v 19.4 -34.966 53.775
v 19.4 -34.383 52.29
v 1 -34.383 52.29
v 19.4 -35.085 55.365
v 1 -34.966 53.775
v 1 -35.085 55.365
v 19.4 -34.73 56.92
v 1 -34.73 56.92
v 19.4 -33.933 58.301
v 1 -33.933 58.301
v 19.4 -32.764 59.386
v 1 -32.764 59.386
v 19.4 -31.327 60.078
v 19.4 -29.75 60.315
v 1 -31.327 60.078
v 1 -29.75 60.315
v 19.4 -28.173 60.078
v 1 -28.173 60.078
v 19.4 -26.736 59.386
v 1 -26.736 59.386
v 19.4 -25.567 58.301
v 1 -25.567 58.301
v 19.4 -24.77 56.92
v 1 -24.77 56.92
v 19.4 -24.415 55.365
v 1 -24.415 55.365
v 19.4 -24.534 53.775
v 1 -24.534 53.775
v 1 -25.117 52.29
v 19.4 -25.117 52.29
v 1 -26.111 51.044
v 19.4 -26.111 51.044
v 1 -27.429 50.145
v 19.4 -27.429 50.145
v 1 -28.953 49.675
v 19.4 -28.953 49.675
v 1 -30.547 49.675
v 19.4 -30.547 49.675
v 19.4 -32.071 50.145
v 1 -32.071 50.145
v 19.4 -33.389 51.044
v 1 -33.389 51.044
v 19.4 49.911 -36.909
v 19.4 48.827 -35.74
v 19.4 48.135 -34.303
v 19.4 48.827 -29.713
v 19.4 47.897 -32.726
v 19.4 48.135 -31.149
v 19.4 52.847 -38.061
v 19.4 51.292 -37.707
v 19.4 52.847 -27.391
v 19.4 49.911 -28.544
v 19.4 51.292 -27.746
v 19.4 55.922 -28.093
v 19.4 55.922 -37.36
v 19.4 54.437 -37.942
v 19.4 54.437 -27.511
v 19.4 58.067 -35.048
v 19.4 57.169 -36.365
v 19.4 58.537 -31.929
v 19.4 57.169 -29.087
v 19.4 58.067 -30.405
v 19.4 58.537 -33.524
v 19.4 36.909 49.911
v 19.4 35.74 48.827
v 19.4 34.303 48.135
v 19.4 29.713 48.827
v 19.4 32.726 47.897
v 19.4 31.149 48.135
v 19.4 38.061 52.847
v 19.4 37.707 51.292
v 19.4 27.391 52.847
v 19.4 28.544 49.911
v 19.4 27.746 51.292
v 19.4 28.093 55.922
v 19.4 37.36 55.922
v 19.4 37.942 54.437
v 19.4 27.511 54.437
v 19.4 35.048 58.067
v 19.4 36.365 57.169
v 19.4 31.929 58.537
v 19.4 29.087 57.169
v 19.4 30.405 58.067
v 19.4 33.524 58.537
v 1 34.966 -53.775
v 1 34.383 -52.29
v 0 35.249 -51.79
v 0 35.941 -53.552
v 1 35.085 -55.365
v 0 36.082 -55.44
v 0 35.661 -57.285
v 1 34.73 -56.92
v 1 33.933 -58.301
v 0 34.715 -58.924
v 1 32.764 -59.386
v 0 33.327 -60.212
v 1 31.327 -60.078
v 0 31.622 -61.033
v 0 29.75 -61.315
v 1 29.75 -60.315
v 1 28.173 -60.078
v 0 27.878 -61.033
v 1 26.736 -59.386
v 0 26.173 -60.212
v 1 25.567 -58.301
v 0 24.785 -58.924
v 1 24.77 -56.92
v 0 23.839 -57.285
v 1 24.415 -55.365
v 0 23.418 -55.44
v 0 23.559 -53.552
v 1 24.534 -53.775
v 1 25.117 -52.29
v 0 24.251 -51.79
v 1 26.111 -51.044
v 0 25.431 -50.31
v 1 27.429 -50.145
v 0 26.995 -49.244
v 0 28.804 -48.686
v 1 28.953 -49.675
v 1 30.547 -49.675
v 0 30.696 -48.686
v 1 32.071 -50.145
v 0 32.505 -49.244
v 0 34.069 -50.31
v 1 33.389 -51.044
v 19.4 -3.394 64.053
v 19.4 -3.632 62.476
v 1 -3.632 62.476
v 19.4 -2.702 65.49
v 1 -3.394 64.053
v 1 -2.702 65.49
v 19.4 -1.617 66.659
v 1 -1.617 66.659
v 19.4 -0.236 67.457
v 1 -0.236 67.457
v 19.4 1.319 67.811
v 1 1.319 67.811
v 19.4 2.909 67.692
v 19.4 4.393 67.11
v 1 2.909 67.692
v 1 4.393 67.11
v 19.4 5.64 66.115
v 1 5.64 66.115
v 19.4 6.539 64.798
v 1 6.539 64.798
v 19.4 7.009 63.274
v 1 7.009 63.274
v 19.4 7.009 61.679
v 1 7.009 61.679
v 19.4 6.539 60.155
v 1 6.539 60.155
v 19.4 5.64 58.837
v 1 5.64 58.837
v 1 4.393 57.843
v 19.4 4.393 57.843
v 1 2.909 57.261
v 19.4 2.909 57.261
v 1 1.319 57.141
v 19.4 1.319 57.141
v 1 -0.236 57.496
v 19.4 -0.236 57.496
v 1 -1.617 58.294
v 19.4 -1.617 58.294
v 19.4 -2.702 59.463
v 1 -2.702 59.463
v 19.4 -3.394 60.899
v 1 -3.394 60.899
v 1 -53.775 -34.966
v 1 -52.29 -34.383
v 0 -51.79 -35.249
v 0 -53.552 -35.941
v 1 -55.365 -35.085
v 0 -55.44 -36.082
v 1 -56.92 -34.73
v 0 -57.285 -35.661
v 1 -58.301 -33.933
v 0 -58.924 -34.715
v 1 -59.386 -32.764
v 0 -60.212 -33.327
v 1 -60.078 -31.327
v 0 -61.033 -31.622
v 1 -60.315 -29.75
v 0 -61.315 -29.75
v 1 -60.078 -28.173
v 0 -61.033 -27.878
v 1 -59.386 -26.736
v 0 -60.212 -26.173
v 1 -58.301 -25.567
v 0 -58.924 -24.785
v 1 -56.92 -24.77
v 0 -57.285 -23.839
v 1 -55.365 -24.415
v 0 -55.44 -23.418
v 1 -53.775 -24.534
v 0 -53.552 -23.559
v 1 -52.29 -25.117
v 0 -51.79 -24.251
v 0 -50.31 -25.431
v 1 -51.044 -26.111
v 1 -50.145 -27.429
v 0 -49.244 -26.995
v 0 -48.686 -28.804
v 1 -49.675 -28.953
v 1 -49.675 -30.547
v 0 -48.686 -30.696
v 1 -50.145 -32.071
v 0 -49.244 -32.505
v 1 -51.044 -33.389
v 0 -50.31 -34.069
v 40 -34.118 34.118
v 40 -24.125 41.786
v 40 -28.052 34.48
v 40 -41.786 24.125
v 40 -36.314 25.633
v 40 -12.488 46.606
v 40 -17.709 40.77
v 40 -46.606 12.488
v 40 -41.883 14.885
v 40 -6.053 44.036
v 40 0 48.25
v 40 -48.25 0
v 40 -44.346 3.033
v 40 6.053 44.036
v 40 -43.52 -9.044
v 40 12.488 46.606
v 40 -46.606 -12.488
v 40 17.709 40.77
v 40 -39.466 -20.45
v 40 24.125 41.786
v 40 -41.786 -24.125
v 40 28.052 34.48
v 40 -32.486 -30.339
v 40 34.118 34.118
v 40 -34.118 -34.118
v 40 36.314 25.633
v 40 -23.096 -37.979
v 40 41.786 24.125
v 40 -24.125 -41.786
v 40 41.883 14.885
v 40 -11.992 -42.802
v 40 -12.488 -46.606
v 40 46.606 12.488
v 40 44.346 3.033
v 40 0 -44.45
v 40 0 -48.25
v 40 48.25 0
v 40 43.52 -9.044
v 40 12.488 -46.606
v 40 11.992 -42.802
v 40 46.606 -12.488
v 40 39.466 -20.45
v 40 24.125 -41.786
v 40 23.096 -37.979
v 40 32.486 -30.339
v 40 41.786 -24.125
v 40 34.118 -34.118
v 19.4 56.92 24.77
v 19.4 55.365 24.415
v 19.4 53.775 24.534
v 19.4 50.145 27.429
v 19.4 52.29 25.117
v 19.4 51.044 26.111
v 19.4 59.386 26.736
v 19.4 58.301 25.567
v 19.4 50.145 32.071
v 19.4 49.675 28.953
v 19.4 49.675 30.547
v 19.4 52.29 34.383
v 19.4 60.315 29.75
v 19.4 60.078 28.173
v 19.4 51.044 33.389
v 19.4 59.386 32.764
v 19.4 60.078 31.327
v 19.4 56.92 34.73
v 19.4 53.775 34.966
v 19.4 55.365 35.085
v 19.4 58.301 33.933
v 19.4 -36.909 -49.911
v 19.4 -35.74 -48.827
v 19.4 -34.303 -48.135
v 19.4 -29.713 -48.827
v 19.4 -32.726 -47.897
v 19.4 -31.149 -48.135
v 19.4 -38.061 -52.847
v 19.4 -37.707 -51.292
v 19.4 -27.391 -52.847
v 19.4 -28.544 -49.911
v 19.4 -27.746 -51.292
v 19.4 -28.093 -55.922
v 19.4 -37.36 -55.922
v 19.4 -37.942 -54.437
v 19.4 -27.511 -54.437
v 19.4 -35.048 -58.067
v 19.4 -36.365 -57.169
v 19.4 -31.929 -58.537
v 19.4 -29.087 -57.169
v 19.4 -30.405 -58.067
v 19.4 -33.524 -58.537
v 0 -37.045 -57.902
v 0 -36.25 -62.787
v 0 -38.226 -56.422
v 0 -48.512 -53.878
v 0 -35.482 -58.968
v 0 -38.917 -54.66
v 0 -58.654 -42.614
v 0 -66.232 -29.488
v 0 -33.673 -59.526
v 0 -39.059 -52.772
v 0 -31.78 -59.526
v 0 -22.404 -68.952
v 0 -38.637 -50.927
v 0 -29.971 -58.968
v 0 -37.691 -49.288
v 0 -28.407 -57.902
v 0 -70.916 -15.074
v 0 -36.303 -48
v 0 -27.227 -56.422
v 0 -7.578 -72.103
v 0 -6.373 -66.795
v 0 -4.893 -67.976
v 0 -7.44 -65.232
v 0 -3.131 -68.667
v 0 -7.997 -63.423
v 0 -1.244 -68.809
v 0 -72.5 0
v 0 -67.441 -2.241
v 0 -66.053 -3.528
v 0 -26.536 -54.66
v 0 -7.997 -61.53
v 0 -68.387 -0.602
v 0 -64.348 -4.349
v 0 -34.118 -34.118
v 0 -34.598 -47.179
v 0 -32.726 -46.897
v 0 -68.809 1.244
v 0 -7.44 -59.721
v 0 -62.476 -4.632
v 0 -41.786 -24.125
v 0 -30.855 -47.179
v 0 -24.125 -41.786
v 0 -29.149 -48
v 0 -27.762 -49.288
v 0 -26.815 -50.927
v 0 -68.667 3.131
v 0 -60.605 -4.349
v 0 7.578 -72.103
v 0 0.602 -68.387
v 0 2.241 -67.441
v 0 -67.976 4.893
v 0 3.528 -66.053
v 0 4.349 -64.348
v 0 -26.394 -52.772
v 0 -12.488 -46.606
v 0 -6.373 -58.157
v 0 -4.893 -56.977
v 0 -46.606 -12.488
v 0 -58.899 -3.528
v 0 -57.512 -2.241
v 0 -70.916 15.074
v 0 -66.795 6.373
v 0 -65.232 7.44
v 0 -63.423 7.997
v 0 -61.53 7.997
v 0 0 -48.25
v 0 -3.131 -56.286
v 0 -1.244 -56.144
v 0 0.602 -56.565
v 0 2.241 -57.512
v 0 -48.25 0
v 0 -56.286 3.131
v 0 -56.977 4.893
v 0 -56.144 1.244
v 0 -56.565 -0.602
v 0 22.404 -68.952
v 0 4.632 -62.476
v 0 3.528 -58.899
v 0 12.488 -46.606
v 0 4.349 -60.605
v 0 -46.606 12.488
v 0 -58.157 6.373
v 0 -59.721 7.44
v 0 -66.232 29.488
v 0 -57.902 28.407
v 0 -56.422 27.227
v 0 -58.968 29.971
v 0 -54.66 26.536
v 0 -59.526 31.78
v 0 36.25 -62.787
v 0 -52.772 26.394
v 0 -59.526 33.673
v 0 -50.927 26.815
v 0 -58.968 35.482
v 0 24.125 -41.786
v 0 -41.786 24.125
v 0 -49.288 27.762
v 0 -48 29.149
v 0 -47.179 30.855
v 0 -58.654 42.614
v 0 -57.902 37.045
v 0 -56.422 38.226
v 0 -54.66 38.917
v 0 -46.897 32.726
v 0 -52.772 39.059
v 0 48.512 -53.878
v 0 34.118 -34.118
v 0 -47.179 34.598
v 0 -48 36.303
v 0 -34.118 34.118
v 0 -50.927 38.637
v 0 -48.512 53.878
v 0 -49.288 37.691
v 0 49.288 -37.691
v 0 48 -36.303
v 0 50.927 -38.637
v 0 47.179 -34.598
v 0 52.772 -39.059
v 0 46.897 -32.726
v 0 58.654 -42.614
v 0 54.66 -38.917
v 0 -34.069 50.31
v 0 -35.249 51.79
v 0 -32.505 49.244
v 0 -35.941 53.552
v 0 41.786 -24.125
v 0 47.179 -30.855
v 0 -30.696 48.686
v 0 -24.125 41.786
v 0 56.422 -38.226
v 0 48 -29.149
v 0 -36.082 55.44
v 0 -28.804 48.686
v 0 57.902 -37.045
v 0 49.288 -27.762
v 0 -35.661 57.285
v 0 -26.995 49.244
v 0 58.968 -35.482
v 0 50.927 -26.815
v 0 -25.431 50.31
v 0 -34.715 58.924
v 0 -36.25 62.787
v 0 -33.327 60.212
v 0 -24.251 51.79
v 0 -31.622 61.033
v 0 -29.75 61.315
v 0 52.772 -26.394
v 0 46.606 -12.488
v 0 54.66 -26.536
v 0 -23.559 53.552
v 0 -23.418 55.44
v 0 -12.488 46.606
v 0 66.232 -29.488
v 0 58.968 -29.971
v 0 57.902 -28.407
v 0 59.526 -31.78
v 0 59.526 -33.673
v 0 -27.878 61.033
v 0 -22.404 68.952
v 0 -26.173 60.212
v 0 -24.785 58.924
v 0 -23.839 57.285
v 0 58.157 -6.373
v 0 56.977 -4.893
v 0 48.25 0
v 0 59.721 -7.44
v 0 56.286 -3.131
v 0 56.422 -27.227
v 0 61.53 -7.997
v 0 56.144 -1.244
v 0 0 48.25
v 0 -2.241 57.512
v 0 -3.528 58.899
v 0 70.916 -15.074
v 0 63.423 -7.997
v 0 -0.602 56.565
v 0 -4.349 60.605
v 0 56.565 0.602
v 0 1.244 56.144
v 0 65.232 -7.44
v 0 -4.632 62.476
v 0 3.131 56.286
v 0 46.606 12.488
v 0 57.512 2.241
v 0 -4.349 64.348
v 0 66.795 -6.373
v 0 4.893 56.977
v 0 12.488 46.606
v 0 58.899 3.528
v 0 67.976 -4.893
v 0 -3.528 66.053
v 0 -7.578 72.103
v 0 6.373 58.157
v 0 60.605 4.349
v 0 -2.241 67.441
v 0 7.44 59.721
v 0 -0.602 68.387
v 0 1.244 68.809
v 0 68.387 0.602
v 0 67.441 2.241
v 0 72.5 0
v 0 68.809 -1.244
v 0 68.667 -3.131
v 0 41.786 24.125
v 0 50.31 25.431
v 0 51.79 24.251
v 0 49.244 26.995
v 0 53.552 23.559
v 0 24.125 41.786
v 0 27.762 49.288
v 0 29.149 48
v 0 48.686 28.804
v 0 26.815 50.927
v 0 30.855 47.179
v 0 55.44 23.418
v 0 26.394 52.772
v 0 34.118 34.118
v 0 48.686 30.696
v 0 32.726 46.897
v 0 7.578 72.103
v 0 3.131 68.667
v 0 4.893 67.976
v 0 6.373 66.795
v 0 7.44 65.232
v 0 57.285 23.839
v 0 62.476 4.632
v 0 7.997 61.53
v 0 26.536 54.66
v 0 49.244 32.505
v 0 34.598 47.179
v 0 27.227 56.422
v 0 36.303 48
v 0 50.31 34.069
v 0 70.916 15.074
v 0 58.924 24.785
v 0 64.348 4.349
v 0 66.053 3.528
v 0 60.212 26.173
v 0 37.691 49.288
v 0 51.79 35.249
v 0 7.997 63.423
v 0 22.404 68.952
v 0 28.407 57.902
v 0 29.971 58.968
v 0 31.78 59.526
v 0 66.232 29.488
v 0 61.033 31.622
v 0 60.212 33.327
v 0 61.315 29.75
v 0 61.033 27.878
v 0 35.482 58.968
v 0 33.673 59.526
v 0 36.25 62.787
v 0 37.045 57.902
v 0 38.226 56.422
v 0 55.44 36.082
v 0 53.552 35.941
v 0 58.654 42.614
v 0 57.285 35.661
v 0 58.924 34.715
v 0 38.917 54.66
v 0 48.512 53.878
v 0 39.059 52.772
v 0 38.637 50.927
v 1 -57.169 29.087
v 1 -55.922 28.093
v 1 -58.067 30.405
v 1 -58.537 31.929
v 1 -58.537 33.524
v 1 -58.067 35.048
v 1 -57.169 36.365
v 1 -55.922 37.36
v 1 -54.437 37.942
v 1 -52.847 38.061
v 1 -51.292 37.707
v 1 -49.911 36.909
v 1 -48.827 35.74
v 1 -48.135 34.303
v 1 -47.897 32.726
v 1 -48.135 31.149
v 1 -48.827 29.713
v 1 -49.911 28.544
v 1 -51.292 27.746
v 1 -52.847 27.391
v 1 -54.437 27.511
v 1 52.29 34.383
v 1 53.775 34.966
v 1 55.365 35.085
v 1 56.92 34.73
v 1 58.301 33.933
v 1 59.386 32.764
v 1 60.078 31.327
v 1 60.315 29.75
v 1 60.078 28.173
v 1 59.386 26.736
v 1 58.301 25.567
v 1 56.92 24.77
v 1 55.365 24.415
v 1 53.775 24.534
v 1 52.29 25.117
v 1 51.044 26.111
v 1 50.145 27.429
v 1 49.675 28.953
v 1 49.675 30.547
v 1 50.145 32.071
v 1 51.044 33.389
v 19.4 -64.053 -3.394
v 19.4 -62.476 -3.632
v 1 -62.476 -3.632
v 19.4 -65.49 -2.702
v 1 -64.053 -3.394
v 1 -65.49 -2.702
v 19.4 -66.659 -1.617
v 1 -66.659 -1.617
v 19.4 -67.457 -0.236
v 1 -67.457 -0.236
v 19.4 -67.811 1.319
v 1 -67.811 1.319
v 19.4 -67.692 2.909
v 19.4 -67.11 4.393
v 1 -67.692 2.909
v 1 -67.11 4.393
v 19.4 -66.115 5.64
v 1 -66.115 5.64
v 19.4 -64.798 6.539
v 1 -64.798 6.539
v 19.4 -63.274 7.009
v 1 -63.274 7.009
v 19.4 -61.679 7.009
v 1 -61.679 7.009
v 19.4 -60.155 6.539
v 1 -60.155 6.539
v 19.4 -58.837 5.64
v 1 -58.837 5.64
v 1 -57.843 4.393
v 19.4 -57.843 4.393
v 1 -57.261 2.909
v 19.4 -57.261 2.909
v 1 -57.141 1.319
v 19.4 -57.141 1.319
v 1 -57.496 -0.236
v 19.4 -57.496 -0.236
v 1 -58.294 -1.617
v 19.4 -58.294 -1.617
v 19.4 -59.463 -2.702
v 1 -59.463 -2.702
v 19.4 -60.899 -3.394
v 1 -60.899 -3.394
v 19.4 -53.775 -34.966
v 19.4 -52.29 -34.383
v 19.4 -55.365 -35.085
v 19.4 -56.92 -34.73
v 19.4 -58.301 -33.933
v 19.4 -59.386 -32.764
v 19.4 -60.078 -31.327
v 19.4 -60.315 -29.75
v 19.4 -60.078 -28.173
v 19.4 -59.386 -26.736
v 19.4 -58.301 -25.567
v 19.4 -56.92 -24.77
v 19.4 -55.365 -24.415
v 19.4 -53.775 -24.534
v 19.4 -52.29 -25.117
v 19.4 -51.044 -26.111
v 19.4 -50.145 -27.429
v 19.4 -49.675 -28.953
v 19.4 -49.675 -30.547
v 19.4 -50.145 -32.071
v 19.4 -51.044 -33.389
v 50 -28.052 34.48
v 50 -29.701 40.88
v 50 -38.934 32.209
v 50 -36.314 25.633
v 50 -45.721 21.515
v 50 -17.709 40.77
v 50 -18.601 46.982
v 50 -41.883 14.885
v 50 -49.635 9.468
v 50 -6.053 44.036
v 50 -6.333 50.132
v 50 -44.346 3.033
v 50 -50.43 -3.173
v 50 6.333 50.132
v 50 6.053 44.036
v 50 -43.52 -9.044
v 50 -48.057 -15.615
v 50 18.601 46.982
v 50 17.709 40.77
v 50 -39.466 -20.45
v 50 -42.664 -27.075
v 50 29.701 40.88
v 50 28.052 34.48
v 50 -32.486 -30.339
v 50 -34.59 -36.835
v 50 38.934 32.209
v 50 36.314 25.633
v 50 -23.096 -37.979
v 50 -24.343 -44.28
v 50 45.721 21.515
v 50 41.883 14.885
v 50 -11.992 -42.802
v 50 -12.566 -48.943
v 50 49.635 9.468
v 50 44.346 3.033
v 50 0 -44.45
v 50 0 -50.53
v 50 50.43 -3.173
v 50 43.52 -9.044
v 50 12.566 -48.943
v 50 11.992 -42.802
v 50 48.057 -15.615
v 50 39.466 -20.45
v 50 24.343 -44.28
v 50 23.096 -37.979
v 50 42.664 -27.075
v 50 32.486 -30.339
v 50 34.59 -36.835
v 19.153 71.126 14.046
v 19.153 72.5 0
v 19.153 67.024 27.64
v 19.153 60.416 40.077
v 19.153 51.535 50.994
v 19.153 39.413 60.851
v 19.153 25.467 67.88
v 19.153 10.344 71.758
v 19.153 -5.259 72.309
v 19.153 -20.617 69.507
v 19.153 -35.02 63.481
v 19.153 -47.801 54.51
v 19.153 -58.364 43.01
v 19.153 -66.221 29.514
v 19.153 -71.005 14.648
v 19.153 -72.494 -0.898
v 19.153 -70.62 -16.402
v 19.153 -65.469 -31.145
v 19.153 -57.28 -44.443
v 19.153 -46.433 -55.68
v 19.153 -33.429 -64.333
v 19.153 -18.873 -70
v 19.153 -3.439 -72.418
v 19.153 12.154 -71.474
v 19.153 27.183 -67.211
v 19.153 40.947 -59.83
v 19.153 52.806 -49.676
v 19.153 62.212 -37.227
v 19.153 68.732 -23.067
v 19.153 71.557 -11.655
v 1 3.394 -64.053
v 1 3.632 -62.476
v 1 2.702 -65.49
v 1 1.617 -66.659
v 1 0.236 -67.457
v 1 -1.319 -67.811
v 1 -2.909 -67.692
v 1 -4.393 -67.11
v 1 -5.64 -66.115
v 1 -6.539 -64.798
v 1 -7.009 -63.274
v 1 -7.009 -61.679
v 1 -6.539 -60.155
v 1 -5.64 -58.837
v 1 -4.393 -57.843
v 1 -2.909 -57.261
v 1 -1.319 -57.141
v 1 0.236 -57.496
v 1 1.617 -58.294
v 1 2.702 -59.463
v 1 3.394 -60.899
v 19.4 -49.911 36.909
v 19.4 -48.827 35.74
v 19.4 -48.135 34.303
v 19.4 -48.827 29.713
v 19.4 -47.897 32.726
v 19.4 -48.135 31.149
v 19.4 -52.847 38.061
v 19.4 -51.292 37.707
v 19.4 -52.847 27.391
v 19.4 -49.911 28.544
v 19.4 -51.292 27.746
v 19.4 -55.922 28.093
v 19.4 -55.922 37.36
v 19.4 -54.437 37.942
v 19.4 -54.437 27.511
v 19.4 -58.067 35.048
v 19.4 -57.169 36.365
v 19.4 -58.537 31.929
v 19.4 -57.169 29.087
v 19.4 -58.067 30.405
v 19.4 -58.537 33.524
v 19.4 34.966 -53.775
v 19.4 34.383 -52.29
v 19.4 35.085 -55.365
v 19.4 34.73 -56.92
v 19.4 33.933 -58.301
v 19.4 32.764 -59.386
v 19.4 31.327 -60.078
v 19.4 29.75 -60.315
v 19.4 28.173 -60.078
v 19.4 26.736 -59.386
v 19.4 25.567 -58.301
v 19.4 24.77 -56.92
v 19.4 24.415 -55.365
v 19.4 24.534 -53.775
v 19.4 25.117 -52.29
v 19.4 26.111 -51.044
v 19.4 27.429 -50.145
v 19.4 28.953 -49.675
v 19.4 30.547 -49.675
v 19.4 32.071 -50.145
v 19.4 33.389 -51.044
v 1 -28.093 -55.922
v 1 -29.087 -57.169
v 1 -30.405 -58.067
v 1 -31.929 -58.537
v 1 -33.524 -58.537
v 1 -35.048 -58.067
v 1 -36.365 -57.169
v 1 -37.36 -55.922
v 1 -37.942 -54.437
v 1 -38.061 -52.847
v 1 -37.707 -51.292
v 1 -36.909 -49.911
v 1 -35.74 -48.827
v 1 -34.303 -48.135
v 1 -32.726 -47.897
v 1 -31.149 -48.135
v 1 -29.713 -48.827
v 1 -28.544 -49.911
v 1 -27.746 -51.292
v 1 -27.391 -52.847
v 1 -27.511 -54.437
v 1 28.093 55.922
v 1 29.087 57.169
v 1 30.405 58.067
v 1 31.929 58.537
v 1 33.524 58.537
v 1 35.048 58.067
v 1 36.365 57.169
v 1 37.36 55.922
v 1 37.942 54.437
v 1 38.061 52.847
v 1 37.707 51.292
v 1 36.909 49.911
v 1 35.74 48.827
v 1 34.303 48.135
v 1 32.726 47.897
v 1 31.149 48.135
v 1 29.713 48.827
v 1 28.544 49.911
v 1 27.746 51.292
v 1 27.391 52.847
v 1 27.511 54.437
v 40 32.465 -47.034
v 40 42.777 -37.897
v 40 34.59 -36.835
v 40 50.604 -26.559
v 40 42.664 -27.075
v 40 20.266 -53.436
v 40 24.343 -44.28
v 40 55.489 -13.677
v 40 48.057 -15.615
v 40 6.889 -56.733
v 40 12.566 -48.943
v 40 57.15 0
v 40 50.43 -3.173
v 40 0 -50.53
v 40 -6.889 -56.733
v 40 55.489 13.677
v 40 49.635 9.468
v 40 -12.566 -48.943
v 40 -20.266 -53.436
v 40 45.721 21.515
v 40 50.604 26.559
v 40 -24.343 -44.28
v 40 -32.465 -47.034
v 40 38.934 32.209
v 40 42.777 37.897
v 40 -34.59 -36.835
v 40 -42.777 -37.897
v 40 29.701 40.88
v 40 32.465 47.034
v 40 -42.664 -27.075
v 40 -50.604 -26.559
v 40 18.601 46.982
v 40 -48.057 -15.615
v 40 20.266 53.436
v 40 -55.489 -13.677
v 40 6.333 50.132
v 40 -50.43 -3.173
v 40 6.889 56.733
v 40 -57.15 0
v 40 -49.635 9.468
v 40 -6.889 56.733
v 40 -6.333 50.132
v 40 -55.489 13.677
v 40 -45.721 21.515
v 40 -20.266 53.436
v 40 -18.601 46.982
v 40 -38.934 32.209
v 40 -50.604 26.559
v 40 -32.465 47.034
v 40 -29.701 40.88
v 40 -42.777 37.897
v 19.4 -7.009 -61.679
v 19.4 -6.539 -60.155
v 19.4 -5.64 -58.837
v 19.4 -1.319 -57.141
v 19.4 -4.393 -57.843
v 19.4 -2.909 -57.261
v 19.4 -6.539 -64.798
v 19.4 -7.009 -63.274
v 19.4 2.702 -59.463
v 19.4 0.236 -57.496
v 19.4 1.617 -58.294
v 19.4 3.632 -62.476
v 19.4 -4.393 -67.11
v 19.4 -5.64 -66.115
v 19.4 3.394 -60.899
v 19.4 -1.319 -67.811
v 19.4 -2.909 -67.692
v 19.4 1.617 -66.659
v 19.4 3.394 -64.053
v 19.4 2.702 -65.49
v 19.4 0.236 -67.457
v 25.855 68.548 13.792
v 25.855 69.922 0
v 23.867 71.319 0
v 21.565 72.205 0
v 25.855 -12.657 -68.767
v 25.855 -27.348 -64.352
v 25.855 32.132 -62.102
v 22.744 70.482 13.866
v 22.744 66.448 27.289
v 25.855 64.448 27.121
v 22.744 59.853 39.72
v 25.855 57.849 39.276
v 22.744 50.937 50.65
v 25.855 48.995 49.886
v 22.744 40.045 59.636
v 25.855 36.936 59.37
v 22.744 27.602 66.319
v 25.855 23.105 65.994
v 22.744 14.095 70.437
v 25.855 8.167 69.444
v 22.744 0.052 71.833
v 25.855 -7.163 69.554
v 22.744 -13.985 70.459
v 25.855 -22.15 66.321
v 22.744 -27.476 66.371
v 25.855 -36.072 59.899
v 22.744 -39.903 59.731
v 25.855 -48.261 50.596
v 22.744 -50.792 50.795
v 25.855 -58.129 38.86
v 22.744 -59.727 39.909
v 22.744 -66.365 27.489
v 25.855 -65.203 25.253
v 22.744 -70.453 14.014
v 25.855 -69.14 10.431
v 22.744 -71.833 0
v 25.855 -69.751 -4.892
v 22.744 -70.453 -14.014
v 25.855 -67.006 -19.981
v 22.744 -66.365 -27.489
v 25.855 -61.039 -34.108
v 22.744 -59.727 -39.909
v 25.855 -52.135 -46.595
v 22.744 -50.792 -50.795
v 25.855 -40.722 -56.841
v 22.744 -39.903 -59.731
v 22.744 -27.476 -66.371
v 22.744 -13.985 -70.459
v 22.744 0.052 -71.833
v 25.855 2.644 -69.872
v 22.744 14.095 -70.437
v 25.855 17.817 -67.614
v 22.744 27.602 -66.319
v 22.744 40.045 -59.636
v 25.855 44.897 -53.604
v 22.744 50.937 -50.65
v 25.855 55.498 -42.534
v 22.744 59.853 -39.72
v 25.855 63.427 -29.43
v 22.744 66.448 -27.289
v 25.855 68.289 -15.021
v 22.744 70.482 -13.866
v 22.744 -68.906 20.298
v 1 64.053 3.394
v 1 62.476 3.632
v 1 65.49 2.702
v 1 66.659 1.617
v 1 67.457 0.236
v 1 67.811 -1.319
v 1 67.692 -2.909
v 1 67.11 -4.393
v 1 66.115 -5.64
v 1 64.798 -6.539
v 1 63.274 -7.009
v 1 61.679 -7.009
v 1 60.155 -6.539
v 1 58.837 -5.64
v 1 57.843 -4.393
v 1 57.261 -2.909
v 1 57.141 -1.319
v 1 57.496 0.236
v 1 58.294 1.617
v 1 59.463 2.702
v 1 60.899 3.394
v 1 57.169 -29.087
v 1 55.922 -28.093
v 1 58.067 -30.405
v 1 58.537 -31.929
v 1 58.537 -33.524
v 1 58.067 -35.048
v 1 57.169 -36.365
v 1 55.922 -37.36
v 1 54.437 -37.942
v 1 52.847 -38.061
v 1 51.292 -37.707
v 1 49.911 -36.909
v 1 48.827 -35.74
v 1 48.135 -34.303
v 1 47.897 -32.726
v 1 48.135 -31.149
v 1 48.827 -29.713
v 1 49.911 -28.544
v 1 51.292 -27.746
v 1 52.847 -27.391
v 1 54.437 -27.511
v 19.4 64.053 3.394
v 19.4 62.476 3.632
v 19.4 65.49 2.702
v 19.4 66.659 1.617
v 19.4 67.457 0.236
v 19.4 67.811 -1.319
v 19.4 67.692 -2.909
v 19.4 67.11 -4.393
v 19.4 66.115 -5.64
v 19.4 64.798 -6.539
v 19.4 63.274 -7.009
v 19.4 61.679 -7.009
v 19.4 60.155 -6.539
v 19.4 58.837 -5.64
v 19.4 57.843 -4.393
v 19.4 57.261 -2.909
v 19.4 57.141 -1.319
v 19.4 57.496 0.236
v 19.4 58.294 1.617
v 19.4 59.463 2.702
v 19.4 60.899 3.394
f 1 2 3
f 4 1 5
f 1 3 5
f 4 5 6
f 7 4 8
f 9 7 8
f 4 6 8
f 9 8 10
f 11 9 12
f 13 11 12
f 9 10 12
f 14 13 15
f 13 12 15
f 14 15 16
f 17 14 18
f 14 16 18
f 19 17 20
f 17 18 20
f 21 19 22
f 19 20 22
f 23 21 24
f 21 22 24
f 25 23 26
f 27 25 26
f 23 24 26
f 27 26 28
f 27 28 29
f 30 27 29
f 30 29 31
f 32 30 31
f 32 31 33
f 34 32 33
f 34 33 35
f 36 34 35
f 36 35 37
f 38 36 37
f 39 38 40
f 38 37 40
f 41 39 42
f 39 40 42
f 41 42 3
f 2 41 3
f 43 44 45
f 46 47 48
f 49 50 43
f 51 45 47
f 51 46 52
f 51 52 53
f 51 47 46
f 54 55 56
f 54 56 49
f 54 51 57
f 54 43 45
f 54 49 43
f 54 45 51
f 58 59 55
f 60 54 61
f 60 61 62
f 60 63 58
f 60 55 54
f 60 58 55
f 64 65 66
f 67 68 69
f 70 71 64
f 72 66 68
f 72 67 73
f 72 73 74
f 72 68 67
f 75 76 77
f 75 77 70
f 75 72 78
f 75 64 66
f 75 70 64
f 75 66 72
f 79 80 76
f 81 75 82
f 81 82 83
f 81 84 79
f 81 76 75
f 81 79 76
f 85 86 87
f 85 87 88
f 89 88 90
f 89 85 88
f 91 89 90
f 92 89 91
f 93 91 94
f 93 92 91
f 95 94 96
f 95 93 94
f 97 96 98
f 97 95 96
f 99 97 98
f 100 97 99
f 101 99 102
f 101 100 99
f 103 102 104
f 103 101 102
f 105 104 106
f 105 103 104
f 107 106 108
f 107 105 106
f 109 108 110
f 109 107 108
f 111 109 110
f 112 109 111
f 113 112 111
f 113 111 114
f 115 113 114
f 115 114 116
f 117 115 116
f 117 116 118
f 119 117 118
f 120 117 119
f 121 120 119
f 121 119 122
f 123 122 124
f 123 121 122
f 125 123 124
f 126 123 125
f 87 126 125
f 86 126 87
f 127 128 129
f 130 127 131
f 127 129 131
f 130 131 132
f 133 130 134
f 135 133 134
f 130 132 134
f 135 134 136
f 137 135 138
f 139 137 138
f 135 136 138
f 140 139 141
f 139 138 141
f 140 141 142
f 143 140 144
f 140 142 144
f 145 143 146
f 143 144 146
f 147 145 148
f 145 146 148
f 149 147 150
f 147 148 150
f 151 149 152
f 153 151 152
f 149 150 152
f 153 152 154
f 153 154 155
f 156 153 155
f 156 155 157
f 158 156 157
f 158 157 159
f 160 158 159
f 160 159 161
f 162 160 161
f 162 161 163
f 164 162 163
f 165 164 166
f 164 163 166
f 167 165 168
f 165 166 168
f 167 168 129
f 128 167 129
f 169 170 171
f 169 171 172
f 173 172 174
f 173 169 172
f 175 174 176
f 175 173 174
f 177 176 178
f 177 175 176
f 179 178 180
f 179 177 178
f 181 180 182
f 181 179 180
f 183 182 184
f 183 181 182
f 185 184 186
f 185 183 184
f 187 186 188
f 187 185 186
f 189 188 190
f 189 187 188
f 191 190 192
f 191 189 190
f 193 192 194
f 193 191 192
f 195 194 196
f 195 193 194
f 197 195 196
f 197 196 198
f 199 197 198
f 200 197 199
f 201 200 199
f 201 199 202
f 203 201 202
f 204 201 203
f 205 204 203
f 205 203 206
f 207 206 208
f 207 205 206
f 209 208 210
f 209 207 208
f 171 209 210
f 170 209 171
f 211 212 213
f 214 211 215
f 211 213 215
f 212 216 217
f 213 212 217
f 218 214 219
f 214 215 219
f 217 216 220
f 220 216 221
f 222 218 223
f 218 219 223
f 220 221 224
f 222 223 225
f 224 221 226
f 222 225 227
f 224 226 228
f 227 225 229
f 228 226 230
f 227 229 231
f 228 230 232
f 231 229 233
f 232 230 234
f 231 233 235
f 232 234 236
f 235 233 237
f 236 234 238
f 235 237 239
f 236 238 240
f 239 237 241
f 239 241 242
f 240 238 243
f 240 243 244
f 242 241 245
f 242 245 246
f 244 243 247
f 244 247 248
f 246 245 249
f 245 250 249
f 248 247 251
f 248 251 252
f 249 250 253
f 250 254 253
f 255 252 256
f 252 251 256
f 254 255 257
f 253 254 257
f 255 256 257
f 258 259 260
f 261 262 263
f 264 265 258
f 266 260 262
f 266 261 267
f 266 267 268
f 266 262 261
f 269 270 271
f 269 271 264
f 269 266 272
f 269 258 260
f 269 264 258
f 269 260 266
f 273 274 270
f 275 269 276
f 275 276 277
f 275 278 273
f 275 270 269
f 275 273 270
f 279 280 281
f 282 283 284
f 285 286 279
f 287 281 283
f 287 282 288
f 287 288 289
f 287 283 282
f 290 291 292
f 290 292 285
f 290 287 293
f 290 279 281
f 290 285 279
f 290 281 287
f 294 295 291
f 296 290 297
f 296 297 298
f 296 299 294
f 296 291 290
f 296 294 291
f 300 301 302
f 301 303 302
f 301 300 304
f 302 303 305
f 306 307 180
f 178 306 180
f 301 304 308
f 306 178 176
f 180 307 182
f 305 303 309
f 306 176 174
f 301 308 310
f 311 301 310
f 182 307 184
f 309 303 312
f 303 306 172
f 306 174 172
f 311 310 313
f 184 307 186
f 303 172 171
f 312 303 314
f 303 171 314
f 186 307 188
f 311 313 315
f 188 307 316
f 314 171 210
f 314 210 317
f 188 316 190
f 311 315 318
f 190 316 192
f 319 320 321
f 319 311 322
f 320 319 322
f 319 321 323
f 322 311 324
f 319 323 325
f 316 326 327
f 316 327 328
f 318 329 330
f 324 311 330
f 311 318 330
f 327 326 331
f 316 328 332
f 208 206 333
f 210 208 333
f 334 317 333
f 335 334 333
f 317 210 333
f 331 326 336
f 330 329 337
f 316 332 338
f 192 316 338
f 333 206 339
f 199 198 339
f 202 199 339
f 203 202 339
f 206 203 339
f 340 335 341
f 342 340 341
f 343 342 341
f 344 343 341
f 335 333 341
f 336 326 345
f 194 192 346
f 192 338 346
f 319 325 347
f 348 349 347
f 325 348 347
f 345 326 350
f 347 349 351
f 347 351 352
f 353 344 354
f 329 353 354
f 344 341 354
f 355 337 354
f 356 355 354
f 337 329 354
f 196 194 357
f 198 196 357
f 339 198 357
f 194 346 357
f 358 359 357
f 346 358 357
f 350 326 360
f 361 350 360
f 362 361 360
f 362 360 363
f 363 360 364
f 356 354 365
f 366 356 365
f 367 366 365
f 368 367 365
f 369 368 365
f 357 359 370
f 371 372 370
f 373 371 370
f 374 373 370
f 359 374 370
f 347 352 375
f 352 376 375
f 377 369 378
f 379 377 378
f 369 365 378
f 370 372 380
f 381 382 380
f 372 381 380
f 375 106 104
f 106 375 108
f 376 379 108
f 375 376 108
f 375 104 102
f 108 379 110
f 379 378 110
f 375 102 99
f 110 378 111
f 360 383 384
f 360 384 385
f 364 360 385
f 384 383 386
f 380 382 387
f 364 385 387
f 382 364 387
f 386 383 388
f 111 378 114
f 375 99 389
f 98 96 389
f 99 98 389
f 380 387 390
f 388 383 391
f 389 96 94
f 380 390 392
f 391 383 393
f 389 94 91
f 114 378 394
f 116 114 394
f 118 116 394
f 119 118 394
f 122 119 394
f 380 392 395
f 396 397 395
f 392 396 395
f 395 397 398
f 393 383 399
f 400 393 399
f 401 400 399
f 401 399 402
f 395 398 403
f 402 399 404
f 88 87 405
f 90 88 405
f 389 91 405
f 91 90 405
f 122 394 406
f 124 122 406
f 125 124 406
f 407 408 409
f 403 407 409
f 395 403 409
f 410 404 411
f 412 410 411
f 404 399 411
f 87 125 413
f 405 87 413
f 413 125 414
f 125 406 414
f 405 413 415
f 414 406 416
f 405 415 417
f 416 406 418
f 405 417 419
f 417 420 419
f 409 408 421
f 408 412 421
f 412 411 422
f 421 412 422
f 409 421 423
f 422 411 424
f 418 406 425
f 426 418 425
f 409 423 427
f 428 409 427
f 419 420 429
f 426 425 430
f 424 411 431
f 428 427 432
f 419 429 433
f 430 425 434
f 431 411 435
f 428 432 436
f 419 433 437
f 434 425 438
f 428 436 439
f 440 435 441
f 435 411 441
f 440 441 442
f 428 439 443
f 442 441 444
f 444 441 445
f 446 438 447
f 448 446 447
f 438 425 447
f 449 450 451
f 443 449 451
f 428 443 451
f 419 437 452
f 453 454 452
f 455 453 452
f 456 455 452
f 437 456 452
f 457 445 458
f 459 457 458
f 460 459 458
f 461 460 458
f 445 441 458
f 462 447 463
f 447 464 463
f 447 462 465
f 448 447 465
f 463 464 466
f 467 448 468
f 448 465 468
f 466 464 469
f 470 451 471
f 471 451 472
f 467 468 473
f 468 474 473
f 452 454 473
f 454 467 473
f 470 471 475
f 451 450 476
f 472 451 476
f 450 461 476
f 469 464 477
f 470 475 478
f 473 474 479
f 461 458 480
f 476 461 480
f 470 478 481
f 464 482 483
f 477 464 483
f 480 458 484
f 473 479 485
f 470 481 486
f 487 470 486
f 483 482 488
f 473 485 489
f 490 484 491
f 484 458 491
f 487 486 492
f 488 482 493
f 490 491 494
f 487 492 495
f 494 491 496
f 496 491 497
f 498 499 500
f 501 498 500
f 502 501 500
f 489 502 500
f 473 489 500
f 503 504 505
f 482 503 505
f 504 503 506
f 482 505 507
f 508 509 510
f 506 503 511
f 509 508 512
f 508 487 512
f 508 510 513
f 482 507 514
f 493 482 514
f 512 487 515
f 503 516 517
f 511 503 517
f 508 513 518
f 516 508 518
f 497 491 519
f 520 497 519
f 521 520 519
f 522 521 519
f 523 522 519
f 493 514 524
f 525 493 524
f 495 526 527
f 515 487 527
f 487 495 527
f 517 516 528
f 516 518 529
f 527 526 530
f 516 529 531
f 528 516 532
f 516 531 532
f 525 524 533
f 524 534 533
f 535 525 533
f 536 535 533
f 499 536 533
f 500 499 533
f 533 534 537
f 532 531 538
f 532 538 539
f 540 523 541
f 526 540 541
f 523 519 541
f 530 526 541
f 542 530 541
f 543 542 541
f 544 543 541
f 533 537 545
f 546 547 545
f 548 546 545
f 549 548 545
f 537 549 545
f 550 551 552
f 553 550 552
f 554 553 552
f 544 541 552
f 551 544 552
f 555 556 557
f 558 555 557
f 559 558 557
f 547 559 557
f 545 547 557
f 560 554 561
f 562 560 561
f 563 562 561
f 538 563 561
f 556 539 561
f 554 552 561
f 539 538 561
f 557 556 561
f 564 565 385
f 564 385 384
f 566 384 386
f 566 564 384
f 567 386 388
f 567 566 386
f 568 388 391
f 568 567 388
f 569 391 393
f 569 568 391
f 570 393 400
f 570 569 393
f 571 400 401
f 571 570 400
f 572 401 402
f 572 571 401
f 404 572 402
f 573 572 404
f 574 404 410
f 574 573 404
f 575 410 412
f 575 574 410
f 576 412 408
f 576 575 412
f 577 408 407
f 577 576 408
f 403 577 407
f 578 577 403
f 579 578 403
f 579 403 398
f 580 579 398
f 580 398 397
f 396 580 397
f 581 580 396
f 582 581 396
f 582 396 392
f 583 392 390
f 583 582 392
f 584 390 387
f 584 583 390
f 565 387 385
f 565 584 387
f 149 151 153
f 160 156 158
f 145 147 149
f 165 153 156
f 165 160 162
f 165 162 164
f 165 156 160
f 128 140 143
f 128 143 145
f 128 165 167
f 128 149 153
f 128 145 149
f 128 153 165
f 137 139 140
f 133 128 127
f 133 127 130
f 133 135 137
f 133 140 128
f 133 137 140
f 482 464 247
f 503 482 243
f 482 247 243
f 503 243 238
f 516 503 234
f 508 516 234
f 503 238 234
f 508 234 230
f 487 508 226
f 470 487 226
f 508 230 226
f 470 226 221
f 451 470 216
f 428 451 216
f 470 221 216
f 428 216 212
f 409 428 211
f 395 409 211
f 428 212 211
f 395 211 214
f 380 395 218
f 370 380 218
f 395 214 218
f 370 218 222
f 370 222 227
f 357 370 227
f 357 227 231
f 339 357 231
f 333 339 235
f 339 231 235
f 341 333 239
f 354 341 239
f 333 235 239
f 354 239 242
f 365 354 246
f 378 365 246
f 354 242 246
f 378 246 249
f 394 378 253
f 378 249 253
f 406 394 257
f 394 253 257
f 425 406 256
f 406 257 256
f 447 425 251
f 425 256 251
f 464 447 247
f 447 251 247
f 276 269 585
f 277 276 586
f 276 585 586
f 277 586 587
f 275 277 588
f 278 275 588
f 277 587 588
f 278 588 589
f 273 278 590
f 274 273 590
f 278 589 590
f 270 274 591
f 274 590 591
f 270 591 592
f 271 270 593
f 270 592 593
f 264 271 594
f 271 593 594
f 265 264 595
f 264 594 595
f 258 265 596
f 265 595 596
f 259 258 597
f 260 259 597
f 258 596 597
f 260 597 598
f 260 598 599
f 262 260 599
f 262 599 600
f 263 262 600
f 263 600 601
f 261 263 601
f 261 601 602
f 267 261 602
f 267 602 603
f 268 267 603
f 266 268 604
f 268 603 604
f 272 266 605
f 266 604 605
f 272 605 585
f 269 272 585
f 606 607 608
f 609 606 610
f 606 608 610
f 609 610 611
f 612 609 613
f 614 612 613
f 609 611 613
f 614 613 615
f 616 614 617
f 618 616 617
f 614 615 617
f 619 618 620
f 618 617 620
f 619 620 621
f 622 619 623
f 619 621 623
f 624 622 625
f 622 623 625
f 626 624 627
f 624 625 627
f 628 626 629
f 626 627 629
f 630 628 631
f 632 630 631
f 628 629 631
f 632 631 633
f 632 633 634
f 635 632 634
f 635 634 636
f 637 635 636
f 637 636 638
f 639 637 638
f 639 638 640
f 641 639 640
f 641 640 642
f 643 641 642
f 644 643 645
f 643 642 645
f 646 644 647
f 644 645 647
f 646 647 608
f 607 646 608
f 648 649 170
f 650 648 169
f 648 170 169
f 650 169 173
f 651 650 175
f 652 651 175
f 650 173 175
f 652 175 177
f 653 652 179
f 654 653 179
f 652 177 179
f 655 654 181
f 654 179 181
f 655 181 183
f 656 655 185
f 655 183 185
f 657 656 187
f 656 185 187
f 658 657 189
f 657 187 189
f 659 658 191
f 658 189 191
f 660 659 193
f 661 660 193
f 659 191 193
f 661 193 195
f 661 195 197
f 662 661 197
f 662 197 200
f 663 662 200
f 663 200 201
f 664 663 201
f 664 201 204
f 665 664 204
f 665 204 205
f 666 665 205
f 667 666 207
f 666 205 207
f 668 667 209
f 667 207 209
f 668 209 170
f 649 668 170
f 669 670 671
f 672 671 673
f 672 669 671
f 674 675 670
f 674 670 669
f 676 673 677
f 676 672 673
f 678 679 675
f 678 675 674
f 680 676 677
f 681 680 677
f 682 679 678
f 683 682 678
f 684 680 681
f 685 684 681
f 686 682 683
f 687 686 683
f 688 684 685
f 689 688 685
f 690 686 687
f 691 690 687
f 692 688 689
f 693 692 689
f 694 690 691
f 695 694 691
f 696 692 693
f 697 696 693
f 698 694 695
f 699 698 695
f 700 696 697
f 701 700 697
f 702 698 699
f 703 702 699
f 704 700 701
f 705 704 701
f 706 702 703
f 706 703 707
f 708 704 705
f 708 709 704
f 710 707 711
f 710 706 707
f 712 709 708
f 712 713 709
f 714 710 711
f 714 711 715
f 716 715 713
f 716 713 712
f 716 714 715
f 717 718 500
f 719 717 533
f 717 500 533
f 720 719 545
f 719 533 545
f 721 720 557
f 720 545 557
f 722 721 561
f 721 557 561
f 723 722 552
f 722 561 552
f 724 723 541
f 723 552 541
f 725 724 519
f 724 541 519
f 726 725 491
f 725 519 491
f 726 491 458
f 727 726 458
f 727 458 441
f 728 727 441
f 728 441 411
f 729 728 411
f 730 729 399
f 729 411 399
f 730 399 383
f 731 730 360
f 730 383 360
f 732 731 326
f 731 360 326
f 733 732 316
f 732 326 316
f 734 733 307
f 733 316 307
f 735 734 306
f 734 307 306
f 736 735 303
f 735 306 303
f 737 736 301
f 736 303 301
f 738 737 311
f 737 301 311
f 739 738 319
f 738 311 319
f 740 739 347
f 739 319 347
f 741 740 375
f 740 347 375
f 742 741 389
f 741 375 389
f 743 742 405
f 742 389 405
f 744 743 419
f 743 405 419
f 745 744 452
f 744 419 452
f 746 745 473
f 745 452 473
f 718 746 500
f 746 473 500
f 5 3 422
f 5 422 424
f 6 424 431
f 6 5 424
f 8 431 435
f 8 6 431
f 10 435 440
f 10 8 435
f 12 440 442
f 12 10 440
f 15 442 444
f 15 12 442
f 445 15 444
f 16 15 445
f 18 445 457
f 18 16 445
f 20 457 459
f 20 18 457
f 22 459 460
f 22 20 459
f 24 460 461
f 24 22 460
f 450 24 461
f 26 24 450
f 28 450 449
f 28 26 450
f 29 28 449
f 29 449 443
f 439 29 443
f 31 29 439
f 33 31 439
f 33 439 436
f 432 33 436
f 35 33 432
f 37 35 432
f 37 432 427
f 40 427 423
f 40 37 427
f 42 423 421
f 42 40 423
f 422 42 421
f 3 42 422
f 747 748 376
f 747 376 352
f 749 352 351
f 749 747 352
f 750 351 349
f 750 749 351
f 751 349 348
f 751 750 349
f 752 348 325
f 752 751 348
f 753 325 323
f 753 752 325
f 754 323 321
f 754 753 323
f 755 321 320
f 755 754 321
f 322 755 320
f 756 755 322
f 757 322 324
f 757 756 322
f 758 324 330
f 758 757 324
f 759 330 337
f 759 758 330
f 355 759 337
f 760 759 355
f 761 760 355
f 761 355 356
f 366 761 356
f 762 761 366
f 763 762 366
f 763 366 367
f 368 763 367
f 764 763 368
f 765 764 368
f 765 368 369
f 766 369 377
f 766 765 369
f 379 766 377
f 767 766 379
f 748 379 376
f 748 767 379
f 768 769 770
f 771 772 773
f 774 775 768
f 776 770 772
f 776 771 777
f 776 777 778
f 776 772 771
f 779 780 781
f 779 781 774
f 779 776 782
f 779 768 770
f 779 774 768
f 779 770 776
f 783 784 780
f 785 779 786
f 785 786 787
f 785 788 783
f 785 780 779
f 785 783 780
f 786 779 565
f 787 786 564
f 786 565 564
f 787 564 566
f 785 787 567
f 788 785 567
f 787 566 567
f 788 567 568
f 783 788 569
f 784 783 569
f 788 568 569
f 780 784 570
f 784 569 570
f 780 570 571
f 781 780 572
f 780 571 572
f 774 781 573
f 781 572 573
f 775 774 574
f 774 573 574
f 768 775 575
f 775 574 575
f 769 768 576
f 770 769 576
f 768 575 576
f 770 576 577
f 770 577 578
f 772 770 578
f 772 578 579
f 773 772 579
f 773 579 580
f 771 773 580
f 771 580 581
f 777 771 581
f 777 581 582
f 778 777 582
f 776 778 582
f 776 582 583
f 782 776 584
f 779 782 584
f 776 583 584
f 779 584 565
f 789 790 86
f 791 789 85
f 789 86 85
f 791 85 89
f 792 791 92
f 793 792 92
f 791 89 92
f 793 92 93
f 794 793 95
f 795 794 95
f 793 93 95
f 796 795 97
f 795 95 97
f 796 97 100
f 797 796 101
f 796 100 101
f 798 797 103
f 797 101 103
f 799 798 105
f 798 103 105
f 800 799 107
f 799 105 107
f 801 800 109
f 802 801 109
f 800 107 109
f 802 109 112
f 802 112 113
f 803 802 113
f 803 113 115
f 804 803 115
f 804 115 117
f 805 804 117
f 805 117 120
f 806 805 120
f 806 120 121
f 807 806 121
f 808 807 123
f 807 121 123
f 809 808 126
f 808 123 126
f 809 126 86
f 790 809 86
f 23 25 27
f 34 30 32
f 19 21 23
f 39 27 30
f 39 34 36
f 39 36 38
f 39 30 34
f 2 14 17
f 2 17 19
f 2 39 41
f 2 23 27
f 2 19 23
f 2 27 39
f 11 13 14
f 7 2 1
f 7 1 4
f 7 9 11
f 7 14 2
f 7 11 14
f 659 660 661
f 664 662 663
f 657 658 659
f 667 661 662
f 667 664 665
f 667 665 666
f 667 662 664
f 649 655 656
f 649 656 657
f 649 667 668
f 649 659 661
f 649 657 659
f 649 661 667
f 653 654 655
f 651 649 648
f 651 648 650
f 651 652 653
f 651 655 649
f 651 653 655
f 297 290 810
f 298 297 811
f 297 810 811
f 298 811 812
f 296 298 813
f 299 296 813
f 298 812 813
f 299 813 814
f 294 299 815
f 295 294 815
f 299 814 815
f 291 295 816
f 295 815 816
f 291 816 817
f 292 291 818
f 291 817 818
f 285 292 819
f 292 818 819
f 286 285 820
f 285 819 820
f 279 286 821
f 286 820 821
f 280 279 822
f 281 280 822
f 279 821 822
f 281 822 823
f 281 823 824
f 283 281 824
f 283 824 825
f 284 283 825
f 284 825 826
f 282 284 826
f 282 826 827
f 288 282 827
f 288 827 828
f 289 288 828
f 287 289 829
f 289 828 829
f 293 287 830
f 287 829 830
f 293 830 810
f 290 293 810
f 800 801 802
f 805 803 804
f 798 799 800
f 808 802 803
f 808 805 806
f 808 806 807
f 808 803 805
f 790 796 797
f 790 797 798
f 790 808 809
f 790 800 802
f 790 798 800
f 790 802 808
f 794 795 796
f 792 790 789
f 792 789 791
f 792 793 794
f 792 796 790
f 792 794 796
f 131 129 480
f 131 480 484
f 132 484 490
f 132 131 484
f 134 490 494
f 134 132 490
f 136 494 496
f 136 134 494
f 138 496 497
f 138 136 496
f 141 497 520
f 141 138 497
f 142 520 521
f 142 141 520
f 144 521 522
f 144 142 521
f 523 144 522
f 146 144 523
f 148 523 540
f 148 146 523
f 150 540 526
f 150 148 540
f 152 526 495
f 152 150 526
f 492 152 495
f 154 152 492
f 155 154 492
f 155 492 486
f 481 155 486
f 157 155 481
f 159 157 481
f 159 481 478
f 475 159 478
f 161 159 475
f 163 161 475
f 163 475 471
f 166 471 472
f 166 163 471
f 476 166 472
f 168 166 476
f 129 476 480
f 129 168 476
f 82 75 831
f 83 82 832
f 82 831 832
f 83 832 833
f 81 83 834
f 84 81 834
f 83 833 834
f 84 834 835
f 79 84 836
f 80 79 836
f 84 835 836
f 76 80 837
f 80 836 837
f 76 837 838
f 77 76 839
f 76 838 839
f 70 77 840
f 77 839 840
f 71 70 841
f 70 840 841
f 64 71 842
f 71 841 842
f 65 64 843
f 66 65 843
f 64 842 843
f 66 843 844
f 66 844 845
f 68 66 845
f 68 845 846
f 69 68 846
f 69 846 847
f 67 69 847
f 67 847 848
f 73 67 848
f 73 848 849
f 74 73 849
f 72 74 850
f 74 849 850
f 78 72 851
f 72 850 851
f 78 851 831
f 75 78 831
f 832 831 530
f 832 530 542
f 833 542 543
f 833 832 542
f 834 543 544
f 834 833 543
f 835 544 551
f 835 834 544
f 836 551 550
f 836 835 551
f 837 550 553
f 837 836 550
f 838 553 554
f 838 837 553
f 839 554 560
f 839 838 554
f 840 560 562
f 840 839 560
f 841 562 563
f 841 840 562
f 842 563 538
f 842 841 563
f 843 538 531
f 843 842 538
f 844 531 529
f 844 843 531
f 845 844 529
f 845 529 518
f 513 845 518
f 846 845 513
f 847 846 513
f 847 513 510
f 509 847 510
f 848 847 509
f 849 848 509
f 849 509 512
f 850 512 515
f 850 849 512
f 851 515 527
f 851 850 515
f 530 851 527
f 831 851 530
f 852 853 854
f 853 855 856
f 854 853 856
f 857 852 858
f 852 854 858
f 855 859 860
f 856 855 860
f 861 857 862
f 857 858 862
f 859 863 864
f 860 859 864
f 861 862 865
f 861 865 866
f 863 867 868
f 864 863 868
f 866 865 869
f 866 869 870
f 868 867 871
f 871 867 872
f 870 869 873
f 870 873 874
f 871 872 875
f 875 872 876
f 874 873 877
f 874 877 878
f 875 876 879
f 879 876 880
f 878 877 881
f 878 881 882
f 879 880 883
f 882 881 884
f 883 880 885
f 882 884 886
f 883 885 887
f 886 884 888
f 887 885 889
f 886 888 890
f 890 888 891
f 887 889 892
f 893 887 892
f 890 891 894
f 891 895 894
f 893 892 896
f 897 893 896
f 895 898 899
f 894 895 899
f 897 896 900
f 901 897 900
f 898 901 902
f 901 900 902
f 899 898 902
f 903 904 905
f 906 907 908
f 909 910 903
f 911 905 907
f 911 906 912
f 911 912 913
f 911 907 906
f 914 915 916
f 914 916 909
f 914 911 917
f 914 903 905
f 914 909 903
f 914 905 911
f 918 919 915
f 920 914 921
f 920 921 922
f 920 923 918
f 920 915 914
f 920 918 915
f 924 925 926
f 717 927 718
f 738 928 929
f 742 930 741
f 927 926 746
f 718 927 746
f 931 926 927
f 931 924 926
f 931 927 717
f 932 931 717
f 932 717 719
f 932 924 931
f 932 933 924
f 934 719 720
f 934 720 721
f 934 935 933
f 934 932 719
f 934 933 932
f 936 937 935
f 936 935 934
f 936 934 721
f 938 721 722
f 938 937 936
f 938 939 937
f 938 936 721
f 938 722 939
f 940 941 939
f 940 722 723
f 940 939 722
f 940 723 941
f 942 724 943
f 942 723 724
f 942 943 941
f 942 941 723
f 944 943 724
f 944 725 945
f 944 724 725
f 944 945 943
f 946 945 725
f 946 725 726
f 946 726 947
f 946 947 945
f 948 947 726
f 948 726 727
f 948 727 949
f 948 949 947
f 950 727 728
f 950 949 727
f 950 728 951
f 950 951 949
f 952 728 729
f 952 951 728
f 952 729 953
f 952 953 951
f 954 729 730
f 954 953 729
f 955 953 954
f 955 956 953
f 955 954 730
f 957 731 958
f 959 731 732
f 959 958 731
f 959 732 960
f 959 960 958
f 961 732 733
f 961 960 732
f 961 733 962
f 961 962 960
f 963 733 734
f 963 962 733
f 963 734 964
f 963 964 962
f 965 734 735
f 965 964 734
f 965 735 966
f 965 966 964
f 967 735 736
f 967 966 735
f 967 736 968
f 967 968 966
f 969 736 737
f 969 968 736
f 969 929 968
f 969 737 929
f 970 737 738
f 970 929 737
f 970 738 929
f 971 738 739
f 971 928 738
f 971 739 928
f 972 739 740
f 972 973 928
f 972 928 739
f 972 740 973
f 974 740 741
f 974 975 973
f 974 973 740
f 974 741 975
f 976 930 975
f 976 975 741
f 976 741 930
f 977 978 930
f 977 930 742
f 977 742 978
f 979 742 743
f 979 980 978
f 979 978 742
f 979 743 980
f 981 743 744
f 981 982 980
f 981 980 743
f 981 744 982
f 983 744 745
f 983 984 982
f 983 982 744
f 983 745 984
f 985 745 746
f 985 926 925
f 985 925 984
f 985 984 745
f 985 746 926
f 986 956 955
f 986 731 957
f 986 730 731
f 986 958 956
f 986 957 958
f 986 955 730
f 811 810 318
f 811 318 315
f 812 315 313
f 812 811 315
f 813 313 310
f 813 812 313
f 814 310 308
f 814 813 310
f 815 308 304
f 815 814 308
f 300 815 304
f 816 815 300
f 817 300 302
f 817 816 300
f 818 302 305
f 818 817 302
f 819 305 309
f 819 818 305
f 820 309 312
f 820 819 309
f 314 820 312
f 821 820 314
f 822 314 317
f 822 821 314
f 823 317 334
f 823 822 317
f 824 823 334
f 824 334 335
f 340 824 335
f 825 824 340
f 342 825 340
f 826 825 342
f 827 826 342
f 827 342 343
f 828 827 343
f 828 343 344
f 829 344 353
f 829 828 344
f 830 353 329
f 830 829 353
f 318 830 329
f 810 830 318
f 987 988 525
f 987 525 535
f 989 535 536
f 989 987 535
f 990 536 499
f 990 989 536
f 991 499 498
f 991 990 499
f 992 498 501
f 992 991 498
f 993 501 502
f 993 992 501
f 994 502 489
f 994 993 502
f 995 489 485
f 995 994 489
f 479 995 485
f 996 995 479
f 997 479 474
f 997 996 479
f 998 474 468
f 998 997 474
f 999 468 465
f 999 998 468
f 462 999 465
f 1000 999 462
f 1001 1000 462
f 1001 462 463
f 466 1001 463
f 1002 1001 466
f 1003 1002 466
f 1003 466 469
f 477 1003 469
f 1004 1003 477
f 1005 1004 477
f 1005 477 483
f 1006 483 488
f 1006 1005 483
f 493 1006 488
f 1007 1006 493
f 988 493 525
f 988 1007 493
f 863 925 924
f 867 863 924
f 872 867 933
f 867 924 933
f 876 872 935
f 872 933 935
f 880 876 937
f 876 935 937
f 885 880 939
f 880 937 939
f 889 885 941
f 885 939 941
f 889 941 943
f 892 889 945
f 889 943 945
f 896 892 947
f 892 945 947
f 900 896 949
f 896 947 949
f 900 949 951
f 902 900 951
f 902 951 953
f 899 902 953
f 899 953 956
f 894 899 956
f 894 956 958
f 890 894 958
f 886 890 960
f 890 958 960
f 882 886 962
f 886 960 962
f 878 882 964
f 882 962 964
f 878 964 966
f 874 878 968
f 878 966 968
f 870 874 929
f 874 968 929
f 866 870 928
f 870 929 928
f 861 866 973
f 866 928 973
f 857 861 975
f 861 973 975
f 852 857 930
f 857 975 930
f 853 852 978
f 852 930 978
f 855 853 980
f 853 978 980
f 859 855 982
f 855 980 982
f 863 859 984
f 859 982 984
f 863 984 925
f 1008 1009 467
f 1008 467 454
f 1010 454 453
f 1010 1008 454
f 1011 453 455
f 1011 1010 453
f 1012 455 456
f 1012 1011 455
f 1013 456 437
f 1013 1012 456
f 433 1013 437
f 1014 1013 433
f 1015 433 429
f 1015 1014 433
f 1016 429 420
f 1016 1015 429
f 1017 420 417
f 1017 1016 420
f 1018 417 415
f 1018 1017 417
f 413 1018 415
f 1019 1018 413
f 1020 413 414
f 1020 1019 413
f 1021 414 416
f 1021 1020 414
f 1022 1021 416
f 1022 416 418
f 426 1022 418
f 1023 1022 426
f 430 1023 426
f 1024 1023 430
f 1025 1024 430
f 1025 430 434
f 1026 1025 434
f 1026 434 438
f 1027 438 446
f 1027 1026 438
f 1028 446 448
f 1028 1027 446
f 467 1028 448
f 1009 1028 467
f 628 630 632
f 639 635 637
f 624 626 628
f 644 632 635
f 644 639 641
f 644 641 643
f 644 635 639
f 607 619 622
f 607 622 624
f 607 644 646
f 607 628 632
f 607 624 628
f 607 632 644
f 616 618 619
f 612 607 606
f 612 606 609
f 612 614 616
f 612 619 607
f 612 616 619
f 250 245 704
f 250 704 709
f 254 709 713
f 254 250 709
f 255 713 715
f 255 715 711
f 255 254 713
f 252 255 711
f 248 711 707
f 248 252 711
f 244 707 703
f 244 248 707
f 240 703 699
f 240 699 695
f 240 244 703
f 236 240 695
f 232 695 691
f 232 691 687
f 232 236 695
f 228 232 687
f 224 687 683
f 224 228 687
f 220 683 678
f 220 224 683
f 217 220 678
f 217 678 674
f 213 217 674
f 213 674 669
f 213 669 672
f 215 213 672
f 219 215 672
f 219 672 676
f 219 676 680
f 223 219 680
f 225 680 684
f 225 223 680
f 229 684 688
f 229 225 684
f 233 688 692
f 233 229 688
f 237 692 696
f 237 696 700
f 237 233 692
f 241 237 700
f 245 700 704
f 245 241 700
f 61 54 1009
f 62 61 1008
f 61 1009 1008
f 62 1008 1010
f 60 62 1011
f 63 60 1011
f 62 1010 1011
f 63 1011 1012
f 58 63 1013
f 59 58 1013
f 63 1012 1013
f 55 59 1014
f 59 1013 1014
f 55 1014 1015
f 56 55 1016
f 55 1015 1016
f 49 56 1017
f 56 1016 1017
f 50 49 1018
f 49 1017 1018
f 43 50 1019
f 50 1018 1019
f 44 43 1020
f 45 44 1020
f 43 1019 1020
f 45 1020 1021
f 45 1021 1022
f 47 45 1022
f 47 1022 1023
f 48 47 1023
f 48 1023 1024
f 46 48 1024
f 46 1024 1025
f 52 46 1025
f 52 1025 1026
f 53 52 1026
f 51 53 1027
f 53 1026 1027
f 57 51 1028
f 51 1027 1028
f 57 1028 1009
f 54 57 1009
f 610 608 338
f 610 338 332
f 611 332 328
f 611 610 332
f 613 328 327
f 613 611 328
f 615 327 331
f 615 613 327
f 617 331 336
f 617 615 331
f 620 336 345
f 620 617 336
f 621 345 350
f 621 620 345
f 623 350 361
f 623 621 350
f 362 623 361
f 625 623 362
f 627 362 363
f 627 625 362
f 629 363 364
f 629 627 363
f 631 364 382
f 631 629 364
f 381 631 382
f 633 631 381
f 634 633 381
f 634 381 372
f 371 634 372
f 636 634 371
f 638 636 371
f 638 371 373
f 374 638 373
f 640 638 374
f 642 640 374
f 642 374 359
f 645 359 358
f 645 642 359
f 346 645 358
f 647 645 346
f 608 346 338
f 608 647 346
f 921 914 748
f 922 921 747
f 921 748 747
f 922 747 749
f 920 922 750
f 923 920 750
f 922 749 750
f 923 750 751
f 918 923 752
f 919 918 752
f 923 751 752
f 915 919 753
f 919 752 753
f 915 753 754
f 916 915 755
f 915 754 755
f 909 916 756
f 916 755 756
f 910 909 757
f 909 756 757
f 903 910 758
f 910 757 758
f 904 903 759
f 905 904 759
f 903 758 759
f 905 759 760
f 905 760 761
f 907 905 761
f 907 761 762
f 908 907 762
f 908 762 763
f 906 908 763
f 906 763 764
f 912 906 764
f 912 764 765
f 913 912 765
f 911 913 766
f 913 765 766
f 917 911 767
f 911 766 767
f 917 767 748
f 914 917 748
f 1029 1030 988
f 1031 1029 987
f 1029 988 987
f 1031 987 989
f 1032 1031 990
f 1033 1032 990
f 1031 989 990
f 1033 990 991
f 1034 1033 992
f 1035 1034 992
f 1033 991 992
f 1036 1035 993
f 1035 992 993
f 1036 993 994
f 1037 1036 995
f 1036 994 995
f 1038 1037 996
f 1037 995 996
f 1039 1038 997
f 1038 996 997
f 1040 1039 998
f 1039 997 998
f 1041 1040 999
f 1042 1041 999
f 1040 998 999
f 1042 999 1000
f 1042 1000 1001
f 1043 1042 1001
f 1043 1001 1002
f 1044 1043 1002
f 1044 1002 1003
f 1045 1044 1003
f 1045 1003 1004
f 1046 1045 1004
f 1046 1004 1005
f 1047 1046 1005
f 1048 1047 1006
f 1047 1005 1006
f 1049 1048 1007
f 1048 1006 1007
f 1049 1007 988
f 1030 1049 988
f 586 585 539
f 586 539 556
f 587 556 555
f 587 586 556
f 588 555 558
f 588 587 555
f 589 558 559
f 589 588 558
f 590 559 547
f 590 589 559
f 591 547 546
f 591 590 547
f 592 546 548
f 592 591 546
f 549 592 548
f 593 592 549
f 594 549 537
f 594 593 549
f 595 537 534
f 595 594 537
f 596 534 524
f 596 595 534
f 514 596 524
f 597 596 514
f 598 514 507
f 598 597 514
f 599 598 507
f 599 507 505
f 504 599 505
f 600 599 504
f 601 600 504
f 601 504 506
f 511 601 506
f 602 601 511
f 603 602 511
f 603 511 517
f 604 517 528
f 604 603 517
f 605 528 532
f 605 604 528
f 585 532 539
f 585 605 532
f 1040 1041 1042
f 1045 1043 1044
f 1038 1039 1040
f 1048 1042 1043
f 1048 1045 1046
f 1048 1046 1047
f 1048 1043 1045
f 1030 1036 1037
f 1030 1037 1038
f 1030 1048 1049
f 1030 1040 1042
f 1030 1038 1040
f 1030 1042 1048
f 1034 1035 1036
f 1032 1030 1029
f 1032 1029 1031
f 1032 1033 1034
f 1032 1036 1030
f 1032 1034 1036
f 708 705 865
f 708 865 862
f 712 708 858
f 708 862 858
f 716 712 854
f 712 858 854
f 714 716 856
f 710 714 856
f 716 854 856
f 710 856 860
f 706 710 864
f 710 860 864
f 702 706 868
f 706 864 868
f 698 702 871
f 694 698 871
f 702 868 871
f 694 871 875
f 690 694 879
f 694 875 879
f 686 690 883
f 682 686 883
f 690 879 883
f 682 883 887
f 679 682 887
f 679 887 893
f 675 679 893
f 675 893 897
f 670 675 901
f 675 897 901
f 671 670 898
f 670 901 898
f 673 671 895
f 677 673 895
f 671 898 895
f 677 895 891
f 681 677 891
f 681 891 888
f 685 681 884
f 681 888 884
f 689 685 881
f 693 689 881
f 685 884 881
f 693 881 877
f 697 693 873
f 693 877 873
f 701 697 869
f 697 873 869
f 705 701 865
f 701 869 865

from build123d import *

# Parameters (mm, degrees)
FILLET1_R                    = 10
SKETCH2_R                    = 50.53
SKETCH2_R_2                  = 44.45
BOSS_EXTRUDE1_DEPTH          = 10
SKETCH3_R                    = 5.35
CUT_EXTRUDE1_DEPTH           = 19.4
CHAMFER1_SIZE                = 1
CIRPATTERN1_COUNT            = 12
CHAMFER1_OF_CIRPATTERN1_SIZE = 1


with BuildPart() as part:
    # Sketch1 → Revolve1 (revolve)
    with BuildSketch(Plane.XY):
        Polygon((0, 48.25), (40, 48.25), (40, 57.15), (23, 72.5), (0, 72.5), align=None)
    revolve(axis=Axis((0, 0, 0), (1, 0, 0)))

    # Fillet1
    fillet1_edges = [part.edges().sort_by_distance(p)[0] for p in [
        (23, -72.5, 0),
    ]]
    fillet(fillet1_edges, radius=FILLET1_R)

    # Sketch2 → Boss-Extrude1 (add)
    with BuildSketch(Plane(origin=(40, 0, 0), x_dir=(0, 0, -1), z_dir=(1, 0, 0))):
        Circle(SKETCH2_R)
        Circle(SKETCH2_R_2, mode=Mode.SUBTRACT)
    extrude(amount=BOSS_EXTRUDE1_DEPTH)

    # Sketch3 → Cut-Extrude1 (cut)
    with BuildSketch(Plane.ZY):
        with Locations((-1.718407093, 62.47637215)):
            Circle(SKETCH3_R)
    cut_extrude1 = extrude(amount=-CUT_EXTRUDE1_DEPTH, mode=Mode.SUBTRACT)

    # Chamfer1
    chamfer1_edges = [part.edges().sort_by_distance(p)[0] for p in [
        (0, 62.47637215, -7.068407093),
    ]]
    chamfer(chamfer1_edges, length=CHAMFER1_SIZE)

    # CirPattern1: Cut-Extrude1 ×12 about axis
    cirpattern1_axis = Axis((0, 0, 0), (1, 0, 0))
    for i in range(1, CIRPATTERN1_COUNT):
        add(cut_extrude1.rotate(cirpattern1_axis, i * 360 / CIRPATTERN1_COUNT), mode=Mode.SUBTRACT)

    # Chamfer1 of CirPattern1
    chamfer1_of_cirpattern1_edges = [part.edges().sort_by_distance(p)[0] for p in [
        (0, 57.640328965, 25.116765969),
        (0, 37.359606182, 50.571921872),
        (0, 7.068407093, 62.47637215),
        (0, -25.116765969, 57.640328965),
        (0, -50.571921872, 37.359606182),
        (0, -62.47637215, 7.068407093),
        (0, -57.640328965, -25.116765969),
        (0, -37.359606182, -50.571921872),
        (0, -7.068407093, -62.47637215),
        (0, 25.116765969, -57.640328965),
        (0, 50.571921872, -37.359606182),
    ]]
    chamfer(chamfer1_of_cirpattern1_edges, length=CHAMFER1_OF_CIRPATTERN1_SIZE)


solid = part.part
